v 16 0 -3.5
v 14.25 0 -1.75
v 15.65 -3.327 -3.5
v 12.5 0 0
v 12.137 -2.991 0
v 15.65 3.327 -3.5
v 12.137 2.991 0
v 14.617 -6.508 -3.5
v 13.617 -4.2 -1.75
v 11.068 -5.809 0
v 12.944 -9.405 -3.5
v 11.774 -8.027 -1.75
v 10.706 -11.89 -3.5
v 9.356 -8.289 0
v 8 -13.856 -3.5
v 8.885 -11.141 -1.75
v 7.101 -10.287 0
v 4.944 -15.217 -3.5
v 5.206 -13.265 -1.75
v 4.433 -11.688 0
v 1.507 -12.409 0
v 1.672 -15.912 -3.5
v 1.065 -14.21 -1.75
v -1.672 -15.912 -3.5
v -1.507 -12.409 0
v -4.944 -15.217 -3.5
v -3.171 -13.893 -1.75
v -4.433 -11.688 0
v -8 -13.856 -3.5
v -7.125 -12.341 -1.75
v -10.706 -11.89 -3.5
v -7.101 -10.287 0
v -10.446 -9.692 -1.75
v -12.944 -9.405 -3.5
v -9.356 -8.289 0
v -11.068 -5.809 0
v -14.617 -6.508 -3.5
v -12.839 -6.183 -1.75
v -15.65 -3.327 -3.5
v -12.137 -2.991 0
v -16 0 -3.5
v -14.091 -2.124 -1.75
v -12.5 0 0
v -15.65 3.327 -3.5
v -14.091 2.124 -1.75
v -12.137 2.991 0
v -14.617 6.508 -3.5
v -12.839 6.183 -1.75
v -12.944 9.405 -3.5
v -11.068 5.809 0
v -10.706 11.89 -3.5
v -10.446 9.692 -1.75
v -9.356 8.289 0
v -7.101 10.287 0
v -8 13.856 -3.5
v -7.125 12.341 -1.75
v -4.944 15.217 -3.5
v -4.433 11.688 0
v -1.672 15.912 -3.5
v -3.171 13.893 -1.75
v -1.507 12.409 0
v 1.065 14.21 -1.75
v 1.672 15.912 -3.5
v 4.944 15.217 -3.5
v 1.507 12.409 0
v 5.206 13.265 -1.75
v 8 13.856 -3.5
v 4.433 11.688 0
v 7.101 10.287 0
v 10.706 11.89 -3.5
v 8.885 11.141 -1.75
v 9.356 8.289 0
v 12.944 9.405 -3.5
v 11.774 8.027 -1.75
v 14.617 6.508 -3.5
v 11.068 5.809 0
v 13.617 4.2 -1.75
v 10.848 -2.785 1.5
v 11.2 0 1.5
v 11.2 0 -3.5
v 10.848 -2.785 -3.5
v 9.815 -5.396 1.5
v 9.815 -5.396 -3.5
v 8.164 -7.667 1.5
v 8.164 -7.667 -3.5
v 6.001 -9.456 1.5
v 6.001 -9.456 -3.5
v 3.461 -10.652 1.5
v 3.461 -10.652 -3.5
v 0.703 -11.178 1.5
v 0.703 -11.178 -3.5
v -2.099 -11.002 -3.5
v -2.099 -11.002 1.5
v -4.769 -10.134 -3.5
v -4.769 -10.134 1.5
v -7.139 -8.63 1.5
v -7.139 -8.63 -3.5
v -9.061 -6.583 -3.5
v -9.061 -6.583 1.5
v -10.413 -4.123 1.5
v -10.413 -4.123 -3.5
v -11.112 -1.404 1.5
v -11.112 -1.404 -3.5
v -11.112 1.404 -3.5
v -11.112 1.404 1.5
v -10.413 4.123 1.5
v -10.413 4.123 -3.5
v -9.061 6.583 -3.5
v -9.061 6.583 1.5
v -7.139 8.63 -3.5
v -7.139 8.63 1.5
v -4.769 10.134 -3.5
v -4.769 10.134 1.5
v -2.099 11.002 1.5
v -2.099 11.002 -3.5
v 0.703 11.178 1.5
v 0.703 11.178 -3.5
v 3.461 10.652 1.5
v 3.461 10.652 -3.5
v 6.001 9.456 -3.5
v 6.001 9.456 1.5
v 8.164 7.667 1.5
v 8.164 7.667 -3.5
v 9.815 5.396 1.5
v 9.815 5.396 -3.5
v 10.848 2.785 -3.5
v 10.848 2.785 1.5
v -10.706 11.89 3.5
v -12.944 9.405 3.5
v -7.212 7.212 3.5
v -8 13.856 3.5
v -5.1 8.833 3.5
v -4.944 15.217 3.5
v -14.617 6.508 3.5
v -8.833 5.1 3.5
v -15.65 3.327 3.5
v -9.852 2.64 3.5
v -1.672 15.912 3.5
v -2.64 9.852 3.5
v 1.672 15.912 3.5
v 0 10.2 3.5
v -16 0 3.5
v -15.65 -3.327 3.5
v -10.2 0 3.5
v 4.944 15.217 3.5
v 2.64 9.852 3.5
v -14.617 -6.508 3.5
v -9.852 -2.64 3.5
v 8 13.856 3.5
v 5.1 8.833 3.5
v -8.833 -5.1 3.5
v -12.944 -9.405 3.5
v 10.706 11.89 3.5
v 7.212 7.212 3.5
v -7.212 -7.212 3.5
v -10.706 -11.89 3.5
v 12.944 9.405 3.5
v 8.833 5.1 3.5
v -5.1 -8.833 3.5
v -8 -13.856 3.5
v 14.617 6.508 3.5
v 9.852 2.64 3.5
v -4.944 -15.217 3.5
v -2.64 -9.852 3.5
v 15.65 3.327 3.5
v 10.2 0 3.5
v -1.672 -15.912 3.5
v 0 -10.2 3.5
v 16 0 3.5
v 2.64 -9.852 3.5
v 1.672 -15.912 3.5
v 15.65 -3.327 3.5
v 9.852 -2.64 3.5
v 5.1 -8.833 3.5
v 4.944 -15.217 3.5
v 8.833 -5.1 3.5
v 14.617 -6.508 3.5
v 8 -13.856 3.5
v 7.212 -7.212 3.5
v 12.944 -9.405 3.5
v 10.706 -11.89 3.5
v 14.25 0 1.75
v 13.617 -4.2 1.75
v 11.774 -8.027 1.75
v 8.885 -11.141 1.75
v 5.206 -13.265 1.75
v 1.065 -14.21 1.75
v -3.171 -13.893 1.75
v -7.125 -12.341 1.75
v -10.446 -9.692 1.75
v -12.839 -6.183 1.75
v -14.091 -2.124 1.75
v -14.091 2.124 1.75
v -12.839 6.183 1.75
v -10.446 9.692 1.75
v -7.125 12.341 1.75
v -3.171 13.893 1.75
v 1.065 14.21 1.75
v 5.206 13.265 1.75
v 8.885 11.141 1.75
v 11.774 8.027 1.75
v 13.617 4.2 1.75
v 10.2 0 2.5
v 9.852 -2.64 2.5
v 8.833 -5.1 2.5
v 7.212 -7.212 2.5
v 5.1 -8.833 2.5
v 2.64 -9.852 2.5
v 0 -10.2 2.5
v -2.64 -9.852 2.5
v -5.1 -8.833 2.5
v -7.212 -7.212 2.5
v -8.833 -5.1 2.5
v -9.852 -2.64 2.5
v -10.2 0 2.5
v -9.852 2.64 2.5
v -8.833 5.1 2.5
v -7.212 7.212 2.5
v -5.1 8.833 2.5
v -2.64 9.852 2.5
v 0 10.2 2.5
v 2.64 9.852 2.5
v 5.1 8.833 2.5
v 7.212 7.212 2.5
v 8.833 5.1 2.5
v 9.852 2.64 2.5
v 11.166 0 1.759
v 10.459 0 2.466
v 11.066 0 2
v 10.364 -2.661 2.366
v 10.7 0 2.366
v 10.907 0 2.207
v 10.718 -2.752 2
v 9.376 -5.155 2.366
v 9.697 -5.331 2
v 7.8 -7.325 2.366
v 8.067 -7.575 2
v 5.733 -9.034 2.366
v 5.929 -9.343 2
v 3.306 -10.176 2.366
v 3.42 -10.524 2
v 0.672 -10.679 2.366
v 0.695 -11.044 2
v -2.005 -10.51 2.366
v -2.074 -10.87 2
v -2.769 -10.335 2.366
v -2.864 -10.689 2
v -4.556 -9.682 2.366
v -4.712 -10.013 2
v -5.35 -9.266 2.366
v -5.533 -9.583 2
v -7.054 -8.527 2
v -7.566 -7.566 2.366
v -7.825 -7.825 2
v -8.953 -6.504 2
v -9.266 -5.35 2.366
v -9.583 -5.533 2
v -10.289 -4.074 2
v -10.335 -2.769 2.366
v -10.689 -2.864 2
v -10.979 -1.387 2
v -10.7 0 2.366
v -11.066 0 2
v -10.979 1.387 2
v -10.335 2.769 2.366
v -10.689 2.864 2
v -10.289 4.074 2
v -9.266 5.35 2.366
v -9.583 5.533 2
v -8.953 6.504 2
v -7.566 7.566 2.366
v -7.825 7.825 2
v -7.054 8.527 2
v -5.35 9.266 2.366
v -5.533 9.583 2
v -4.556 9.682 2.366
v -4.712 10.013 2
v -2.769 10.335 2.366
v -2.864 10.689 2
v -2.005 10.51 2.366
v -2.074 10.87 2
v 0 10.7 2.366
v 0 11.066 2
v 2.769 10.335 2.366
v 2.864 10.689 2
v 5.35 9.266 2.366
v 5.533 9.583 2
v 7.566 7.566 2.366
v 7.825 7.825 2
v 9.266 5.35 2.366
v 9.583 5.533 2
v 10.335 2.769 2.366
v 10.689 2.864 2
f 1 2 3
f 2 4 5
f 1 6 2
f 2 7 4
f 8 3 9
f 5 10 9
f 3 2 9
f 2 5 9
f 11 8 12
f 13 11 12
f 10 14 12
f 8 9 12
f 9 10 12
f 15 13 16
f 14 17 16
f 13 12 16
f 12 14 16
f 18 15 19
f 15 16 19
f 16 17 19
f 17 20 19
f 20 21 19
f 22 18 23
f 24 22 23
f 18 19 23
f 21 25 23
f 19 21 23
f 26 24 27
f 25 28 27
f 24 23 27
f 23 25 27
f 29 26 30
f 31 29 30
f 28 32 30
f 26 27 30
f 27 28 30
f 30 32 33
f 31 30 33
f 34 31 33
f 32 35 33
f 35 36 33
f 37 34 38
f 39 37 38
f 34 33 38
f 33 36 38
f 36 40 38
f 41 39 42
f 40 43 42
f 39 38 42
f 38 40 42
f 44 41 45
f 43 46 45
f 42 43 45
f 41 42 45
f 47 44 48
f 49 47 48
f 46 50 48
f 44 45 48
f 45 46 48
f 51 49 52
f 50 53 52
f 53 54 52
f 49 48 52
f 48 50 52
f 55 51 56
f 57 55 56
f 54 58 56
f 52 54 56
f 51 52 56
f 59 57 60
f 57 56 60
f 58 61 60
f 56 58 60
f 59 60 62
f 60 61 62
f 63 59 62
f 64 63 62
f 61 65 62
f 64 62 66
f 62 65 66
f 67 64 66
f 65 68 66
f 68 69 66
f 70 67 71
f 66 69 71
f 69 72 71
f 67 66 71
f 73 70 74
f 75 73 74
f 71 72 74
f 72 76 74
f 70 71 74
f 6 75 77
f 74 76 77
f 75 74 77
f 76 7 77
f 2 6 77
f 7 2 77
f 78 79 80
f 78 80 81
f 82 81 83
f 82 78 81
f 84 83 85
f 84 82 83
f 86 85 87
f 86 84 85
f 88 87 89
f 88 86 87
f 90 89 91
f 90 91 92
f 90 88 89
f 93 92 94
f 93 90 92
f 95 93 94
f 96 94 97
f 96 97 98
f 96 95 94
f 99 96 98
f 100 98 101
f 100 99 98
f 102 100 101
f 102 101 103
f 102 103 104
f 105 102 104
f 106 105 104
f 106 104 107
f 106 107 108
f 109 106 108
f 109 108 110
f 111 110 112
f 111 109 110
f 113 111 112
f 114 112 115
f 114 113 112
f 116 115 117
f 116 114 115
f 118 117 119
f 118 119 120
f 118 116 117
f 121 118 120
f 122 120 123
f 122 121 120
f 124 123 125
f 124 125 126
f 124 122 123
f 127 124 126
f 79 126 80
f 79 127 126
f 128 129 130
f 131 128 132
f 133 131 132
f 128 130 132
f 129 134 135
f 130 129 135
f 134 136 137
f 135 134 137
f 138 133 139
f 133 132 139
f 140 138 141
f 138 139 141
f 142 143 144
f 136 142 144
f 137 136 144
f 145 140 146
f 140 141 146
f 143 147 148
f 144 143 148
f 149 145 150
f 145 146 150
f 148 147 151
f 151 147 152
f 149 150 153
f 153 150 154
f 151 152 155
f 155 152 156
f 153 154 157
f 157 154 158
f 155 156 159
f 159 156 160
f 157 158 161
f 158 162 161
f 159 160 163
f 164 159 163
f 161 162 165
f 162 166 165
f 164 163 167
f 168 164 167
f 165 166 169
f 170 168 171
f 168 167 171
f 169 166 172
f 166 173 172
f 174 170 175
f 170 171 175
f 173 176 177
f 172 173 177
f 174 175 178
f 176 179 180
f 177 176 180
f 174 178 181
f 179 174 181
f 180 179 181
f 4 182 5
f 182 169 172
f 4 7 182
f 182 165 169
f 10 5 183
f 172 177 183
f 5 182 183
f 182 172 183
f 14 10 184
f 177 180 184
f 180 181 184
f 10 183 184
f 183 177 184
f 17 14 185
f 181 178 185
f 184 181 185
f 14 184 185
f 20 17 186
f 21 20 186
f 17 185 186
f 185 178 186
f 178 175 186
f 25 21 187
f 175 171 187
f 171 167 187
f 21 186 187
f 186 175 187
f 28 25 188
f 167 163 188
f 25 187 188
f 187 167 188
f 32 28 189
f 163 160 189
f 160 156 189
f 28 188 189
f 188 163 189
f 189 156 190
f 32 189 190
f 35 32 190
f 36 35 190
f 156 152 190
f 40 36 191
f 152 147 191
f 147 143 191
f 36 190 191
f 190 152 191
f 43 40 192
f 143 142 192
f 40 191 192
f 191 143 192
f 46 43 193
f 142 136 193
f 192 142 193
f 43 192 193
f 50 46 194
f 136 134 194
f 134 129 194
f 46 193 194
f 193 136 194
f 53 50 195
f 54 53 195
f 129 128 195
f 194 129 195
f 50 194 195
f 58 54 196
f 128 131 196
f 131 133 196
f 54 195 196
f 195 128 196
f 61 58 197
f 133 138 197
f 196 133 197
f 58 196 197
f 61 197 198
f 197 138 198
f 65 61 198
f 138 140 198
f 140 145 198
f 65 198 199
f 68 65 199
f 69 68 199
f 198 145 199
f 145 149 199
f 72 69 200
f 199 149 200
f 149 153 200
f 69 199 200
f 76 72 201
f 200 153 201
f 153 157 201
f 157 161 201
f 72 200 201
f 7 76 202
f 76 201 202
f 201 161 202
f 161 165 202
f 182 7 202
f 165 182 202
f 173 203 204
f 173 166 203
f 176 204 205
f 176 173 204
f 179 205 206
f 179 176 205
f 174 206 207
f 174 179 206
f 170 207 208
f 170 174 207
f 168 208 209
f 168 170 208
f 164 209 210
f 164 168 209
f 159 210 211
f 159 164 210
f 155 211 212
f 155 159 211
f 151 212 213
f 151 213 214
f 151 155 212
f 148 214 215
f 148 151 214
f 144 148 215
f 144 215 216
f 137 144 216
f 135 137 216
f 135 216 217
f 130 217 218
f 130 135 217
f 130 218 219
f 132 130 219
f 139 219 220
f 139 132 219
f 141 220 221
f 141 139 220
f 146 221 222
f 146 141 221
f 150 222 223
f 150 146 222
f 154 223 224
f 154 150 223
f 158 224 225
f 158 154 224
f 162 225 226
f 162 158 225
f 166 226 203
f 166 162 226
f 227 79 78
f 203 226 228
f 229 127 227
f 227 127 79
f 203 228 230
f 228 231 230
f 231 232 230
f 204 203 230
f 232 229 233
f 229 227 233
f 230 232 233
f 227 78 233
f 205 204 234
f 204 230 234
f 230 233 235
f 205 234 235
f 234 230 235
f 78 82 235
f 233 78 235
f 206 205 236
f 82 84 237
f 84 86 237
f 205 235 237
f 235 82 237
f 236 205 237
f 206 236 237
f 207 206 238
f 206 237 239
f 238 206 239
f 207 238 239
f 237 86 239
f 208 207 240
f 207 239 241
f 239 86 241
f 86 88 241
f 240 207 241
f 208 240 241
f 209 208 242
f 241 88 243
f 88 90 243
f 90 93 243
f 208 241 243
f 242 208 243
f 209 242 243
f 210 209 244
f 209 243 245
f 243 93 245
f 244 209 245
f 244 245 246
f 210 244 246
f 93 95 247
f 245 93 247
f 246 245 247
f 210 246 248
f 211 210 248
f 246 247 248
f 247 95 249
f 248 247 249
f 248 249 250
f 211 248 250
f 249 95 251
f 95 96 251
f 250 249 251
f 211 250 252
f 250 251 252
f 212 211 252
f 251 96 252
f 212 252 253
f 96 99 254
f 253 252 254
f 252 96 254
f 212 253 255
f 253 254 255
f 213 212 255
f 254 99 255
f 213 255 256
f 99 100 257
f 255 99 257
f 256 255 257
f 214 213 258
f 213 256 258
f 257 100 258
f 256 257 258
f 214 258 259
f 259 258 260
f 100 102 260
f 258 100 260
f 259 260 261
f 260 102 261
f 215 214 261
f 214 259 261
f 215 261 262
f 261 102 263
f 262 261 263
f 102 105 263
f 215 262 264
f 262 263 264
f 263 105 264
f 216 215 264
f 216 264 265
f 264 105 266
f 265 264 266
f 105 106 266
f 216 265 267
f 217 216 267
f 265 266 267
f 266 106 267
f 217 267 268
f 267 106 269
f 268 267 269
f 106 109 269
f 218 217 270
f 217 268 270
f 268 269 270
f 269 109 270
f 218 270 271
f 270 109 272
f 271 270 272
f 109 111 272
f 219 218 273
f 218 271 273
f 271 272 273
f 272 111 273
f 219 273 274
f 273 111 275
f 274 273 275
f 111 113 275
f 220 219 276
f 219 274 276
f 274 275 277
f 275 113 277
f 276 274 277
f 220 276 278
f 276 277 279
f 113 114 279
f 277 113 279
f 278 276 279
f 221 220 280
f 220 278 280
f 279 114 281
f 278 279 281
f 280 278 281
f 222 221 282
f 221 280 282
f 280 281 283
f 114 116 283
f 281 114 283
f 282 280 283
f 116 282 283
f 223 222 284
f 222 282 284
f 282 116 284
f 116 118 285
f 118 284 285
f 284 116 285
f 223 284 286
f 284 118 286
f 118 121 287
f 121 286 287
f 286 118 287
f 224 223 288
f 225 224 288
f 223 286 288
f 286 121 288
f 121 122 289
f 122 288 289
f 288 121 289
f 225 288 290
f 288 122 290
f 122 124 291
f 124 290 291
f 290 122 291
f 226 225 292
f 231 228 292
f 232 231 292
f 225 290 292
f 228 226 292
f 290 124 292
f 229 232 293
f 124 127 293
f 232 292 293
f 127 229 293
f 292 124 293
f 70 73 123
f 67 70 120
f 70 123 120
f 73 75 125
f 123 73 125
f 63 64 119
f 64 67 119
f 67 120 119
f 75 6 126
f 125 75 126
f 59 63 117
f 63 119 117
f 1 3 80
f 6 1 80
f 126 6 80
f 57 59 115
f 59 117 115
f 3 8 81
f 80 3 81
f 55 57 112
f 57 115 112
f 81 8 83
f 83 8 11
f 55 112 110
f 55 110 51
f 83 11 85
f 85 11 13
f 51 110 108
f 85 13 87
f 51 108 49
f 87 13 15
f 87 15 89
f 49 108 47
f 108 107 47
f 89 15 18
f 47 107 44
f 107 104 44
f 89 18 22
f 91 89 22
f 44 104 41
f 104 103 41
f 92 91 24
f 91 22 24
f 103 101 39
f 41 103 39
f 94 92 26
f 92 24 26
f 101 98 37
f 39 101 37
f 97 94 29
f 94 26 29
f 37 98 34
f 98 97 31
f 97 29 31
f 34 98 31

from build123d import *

# Parameters (mm, degrees)
F0_W = 1
F0_H = 1
F3_R = 0.99999


# Not quite as in the source:
# - a fillet or chamfer is up to 0.001 mm smaller than in the source, because OpenCascade refuses the exact size


with BuildPart() as f1:
    # F0 (on Front) → F1 (revolve)
    with BuildSketch(Plane.XZ):
        Polygon((16, 3.5), (11.2, 3.5), (11.2, 2.5), (11.2, -3.5), (16, -3.5), (12.5, 0), align=None)
        Polygon((10.2, 3.5), (0, 3.5), (0, -3.5), (11.2, -3.5), (11.2, 2.5), (10.2, 2.5), align=None)
        with Locations((10.7, 3)):
            Rectangle(F0_W, F0_H)
    revolve(axis=Axis((0, 0, -0.2485097927), (0, 0, -1)))

    # F0 (on Front) → F2 (revolve, cut)
    with BuildSketch(Plane.XZ):
        Polygon((10.2, 3.5), (0, 3.5), (0, -3.5), (11.2, -3.5), (11.2, 2.5), (10.2, 2.5), align=None)
    revolve(axis=Axis((0, 0, -0.2485097927), (0, 0, -1)), mode=Mode.SUBTRACT)

    # F3 (radius 1 in the source; OpenCascade refuses exactly that, so slightly less here)
    f3_edges = [f1.edges().sort_by_distance(p)[0] for p in [
        (-11.2, 0, 2.5),
    ]]
    fillet(f3_edges, radius=F3_R)


solid = f1.part
